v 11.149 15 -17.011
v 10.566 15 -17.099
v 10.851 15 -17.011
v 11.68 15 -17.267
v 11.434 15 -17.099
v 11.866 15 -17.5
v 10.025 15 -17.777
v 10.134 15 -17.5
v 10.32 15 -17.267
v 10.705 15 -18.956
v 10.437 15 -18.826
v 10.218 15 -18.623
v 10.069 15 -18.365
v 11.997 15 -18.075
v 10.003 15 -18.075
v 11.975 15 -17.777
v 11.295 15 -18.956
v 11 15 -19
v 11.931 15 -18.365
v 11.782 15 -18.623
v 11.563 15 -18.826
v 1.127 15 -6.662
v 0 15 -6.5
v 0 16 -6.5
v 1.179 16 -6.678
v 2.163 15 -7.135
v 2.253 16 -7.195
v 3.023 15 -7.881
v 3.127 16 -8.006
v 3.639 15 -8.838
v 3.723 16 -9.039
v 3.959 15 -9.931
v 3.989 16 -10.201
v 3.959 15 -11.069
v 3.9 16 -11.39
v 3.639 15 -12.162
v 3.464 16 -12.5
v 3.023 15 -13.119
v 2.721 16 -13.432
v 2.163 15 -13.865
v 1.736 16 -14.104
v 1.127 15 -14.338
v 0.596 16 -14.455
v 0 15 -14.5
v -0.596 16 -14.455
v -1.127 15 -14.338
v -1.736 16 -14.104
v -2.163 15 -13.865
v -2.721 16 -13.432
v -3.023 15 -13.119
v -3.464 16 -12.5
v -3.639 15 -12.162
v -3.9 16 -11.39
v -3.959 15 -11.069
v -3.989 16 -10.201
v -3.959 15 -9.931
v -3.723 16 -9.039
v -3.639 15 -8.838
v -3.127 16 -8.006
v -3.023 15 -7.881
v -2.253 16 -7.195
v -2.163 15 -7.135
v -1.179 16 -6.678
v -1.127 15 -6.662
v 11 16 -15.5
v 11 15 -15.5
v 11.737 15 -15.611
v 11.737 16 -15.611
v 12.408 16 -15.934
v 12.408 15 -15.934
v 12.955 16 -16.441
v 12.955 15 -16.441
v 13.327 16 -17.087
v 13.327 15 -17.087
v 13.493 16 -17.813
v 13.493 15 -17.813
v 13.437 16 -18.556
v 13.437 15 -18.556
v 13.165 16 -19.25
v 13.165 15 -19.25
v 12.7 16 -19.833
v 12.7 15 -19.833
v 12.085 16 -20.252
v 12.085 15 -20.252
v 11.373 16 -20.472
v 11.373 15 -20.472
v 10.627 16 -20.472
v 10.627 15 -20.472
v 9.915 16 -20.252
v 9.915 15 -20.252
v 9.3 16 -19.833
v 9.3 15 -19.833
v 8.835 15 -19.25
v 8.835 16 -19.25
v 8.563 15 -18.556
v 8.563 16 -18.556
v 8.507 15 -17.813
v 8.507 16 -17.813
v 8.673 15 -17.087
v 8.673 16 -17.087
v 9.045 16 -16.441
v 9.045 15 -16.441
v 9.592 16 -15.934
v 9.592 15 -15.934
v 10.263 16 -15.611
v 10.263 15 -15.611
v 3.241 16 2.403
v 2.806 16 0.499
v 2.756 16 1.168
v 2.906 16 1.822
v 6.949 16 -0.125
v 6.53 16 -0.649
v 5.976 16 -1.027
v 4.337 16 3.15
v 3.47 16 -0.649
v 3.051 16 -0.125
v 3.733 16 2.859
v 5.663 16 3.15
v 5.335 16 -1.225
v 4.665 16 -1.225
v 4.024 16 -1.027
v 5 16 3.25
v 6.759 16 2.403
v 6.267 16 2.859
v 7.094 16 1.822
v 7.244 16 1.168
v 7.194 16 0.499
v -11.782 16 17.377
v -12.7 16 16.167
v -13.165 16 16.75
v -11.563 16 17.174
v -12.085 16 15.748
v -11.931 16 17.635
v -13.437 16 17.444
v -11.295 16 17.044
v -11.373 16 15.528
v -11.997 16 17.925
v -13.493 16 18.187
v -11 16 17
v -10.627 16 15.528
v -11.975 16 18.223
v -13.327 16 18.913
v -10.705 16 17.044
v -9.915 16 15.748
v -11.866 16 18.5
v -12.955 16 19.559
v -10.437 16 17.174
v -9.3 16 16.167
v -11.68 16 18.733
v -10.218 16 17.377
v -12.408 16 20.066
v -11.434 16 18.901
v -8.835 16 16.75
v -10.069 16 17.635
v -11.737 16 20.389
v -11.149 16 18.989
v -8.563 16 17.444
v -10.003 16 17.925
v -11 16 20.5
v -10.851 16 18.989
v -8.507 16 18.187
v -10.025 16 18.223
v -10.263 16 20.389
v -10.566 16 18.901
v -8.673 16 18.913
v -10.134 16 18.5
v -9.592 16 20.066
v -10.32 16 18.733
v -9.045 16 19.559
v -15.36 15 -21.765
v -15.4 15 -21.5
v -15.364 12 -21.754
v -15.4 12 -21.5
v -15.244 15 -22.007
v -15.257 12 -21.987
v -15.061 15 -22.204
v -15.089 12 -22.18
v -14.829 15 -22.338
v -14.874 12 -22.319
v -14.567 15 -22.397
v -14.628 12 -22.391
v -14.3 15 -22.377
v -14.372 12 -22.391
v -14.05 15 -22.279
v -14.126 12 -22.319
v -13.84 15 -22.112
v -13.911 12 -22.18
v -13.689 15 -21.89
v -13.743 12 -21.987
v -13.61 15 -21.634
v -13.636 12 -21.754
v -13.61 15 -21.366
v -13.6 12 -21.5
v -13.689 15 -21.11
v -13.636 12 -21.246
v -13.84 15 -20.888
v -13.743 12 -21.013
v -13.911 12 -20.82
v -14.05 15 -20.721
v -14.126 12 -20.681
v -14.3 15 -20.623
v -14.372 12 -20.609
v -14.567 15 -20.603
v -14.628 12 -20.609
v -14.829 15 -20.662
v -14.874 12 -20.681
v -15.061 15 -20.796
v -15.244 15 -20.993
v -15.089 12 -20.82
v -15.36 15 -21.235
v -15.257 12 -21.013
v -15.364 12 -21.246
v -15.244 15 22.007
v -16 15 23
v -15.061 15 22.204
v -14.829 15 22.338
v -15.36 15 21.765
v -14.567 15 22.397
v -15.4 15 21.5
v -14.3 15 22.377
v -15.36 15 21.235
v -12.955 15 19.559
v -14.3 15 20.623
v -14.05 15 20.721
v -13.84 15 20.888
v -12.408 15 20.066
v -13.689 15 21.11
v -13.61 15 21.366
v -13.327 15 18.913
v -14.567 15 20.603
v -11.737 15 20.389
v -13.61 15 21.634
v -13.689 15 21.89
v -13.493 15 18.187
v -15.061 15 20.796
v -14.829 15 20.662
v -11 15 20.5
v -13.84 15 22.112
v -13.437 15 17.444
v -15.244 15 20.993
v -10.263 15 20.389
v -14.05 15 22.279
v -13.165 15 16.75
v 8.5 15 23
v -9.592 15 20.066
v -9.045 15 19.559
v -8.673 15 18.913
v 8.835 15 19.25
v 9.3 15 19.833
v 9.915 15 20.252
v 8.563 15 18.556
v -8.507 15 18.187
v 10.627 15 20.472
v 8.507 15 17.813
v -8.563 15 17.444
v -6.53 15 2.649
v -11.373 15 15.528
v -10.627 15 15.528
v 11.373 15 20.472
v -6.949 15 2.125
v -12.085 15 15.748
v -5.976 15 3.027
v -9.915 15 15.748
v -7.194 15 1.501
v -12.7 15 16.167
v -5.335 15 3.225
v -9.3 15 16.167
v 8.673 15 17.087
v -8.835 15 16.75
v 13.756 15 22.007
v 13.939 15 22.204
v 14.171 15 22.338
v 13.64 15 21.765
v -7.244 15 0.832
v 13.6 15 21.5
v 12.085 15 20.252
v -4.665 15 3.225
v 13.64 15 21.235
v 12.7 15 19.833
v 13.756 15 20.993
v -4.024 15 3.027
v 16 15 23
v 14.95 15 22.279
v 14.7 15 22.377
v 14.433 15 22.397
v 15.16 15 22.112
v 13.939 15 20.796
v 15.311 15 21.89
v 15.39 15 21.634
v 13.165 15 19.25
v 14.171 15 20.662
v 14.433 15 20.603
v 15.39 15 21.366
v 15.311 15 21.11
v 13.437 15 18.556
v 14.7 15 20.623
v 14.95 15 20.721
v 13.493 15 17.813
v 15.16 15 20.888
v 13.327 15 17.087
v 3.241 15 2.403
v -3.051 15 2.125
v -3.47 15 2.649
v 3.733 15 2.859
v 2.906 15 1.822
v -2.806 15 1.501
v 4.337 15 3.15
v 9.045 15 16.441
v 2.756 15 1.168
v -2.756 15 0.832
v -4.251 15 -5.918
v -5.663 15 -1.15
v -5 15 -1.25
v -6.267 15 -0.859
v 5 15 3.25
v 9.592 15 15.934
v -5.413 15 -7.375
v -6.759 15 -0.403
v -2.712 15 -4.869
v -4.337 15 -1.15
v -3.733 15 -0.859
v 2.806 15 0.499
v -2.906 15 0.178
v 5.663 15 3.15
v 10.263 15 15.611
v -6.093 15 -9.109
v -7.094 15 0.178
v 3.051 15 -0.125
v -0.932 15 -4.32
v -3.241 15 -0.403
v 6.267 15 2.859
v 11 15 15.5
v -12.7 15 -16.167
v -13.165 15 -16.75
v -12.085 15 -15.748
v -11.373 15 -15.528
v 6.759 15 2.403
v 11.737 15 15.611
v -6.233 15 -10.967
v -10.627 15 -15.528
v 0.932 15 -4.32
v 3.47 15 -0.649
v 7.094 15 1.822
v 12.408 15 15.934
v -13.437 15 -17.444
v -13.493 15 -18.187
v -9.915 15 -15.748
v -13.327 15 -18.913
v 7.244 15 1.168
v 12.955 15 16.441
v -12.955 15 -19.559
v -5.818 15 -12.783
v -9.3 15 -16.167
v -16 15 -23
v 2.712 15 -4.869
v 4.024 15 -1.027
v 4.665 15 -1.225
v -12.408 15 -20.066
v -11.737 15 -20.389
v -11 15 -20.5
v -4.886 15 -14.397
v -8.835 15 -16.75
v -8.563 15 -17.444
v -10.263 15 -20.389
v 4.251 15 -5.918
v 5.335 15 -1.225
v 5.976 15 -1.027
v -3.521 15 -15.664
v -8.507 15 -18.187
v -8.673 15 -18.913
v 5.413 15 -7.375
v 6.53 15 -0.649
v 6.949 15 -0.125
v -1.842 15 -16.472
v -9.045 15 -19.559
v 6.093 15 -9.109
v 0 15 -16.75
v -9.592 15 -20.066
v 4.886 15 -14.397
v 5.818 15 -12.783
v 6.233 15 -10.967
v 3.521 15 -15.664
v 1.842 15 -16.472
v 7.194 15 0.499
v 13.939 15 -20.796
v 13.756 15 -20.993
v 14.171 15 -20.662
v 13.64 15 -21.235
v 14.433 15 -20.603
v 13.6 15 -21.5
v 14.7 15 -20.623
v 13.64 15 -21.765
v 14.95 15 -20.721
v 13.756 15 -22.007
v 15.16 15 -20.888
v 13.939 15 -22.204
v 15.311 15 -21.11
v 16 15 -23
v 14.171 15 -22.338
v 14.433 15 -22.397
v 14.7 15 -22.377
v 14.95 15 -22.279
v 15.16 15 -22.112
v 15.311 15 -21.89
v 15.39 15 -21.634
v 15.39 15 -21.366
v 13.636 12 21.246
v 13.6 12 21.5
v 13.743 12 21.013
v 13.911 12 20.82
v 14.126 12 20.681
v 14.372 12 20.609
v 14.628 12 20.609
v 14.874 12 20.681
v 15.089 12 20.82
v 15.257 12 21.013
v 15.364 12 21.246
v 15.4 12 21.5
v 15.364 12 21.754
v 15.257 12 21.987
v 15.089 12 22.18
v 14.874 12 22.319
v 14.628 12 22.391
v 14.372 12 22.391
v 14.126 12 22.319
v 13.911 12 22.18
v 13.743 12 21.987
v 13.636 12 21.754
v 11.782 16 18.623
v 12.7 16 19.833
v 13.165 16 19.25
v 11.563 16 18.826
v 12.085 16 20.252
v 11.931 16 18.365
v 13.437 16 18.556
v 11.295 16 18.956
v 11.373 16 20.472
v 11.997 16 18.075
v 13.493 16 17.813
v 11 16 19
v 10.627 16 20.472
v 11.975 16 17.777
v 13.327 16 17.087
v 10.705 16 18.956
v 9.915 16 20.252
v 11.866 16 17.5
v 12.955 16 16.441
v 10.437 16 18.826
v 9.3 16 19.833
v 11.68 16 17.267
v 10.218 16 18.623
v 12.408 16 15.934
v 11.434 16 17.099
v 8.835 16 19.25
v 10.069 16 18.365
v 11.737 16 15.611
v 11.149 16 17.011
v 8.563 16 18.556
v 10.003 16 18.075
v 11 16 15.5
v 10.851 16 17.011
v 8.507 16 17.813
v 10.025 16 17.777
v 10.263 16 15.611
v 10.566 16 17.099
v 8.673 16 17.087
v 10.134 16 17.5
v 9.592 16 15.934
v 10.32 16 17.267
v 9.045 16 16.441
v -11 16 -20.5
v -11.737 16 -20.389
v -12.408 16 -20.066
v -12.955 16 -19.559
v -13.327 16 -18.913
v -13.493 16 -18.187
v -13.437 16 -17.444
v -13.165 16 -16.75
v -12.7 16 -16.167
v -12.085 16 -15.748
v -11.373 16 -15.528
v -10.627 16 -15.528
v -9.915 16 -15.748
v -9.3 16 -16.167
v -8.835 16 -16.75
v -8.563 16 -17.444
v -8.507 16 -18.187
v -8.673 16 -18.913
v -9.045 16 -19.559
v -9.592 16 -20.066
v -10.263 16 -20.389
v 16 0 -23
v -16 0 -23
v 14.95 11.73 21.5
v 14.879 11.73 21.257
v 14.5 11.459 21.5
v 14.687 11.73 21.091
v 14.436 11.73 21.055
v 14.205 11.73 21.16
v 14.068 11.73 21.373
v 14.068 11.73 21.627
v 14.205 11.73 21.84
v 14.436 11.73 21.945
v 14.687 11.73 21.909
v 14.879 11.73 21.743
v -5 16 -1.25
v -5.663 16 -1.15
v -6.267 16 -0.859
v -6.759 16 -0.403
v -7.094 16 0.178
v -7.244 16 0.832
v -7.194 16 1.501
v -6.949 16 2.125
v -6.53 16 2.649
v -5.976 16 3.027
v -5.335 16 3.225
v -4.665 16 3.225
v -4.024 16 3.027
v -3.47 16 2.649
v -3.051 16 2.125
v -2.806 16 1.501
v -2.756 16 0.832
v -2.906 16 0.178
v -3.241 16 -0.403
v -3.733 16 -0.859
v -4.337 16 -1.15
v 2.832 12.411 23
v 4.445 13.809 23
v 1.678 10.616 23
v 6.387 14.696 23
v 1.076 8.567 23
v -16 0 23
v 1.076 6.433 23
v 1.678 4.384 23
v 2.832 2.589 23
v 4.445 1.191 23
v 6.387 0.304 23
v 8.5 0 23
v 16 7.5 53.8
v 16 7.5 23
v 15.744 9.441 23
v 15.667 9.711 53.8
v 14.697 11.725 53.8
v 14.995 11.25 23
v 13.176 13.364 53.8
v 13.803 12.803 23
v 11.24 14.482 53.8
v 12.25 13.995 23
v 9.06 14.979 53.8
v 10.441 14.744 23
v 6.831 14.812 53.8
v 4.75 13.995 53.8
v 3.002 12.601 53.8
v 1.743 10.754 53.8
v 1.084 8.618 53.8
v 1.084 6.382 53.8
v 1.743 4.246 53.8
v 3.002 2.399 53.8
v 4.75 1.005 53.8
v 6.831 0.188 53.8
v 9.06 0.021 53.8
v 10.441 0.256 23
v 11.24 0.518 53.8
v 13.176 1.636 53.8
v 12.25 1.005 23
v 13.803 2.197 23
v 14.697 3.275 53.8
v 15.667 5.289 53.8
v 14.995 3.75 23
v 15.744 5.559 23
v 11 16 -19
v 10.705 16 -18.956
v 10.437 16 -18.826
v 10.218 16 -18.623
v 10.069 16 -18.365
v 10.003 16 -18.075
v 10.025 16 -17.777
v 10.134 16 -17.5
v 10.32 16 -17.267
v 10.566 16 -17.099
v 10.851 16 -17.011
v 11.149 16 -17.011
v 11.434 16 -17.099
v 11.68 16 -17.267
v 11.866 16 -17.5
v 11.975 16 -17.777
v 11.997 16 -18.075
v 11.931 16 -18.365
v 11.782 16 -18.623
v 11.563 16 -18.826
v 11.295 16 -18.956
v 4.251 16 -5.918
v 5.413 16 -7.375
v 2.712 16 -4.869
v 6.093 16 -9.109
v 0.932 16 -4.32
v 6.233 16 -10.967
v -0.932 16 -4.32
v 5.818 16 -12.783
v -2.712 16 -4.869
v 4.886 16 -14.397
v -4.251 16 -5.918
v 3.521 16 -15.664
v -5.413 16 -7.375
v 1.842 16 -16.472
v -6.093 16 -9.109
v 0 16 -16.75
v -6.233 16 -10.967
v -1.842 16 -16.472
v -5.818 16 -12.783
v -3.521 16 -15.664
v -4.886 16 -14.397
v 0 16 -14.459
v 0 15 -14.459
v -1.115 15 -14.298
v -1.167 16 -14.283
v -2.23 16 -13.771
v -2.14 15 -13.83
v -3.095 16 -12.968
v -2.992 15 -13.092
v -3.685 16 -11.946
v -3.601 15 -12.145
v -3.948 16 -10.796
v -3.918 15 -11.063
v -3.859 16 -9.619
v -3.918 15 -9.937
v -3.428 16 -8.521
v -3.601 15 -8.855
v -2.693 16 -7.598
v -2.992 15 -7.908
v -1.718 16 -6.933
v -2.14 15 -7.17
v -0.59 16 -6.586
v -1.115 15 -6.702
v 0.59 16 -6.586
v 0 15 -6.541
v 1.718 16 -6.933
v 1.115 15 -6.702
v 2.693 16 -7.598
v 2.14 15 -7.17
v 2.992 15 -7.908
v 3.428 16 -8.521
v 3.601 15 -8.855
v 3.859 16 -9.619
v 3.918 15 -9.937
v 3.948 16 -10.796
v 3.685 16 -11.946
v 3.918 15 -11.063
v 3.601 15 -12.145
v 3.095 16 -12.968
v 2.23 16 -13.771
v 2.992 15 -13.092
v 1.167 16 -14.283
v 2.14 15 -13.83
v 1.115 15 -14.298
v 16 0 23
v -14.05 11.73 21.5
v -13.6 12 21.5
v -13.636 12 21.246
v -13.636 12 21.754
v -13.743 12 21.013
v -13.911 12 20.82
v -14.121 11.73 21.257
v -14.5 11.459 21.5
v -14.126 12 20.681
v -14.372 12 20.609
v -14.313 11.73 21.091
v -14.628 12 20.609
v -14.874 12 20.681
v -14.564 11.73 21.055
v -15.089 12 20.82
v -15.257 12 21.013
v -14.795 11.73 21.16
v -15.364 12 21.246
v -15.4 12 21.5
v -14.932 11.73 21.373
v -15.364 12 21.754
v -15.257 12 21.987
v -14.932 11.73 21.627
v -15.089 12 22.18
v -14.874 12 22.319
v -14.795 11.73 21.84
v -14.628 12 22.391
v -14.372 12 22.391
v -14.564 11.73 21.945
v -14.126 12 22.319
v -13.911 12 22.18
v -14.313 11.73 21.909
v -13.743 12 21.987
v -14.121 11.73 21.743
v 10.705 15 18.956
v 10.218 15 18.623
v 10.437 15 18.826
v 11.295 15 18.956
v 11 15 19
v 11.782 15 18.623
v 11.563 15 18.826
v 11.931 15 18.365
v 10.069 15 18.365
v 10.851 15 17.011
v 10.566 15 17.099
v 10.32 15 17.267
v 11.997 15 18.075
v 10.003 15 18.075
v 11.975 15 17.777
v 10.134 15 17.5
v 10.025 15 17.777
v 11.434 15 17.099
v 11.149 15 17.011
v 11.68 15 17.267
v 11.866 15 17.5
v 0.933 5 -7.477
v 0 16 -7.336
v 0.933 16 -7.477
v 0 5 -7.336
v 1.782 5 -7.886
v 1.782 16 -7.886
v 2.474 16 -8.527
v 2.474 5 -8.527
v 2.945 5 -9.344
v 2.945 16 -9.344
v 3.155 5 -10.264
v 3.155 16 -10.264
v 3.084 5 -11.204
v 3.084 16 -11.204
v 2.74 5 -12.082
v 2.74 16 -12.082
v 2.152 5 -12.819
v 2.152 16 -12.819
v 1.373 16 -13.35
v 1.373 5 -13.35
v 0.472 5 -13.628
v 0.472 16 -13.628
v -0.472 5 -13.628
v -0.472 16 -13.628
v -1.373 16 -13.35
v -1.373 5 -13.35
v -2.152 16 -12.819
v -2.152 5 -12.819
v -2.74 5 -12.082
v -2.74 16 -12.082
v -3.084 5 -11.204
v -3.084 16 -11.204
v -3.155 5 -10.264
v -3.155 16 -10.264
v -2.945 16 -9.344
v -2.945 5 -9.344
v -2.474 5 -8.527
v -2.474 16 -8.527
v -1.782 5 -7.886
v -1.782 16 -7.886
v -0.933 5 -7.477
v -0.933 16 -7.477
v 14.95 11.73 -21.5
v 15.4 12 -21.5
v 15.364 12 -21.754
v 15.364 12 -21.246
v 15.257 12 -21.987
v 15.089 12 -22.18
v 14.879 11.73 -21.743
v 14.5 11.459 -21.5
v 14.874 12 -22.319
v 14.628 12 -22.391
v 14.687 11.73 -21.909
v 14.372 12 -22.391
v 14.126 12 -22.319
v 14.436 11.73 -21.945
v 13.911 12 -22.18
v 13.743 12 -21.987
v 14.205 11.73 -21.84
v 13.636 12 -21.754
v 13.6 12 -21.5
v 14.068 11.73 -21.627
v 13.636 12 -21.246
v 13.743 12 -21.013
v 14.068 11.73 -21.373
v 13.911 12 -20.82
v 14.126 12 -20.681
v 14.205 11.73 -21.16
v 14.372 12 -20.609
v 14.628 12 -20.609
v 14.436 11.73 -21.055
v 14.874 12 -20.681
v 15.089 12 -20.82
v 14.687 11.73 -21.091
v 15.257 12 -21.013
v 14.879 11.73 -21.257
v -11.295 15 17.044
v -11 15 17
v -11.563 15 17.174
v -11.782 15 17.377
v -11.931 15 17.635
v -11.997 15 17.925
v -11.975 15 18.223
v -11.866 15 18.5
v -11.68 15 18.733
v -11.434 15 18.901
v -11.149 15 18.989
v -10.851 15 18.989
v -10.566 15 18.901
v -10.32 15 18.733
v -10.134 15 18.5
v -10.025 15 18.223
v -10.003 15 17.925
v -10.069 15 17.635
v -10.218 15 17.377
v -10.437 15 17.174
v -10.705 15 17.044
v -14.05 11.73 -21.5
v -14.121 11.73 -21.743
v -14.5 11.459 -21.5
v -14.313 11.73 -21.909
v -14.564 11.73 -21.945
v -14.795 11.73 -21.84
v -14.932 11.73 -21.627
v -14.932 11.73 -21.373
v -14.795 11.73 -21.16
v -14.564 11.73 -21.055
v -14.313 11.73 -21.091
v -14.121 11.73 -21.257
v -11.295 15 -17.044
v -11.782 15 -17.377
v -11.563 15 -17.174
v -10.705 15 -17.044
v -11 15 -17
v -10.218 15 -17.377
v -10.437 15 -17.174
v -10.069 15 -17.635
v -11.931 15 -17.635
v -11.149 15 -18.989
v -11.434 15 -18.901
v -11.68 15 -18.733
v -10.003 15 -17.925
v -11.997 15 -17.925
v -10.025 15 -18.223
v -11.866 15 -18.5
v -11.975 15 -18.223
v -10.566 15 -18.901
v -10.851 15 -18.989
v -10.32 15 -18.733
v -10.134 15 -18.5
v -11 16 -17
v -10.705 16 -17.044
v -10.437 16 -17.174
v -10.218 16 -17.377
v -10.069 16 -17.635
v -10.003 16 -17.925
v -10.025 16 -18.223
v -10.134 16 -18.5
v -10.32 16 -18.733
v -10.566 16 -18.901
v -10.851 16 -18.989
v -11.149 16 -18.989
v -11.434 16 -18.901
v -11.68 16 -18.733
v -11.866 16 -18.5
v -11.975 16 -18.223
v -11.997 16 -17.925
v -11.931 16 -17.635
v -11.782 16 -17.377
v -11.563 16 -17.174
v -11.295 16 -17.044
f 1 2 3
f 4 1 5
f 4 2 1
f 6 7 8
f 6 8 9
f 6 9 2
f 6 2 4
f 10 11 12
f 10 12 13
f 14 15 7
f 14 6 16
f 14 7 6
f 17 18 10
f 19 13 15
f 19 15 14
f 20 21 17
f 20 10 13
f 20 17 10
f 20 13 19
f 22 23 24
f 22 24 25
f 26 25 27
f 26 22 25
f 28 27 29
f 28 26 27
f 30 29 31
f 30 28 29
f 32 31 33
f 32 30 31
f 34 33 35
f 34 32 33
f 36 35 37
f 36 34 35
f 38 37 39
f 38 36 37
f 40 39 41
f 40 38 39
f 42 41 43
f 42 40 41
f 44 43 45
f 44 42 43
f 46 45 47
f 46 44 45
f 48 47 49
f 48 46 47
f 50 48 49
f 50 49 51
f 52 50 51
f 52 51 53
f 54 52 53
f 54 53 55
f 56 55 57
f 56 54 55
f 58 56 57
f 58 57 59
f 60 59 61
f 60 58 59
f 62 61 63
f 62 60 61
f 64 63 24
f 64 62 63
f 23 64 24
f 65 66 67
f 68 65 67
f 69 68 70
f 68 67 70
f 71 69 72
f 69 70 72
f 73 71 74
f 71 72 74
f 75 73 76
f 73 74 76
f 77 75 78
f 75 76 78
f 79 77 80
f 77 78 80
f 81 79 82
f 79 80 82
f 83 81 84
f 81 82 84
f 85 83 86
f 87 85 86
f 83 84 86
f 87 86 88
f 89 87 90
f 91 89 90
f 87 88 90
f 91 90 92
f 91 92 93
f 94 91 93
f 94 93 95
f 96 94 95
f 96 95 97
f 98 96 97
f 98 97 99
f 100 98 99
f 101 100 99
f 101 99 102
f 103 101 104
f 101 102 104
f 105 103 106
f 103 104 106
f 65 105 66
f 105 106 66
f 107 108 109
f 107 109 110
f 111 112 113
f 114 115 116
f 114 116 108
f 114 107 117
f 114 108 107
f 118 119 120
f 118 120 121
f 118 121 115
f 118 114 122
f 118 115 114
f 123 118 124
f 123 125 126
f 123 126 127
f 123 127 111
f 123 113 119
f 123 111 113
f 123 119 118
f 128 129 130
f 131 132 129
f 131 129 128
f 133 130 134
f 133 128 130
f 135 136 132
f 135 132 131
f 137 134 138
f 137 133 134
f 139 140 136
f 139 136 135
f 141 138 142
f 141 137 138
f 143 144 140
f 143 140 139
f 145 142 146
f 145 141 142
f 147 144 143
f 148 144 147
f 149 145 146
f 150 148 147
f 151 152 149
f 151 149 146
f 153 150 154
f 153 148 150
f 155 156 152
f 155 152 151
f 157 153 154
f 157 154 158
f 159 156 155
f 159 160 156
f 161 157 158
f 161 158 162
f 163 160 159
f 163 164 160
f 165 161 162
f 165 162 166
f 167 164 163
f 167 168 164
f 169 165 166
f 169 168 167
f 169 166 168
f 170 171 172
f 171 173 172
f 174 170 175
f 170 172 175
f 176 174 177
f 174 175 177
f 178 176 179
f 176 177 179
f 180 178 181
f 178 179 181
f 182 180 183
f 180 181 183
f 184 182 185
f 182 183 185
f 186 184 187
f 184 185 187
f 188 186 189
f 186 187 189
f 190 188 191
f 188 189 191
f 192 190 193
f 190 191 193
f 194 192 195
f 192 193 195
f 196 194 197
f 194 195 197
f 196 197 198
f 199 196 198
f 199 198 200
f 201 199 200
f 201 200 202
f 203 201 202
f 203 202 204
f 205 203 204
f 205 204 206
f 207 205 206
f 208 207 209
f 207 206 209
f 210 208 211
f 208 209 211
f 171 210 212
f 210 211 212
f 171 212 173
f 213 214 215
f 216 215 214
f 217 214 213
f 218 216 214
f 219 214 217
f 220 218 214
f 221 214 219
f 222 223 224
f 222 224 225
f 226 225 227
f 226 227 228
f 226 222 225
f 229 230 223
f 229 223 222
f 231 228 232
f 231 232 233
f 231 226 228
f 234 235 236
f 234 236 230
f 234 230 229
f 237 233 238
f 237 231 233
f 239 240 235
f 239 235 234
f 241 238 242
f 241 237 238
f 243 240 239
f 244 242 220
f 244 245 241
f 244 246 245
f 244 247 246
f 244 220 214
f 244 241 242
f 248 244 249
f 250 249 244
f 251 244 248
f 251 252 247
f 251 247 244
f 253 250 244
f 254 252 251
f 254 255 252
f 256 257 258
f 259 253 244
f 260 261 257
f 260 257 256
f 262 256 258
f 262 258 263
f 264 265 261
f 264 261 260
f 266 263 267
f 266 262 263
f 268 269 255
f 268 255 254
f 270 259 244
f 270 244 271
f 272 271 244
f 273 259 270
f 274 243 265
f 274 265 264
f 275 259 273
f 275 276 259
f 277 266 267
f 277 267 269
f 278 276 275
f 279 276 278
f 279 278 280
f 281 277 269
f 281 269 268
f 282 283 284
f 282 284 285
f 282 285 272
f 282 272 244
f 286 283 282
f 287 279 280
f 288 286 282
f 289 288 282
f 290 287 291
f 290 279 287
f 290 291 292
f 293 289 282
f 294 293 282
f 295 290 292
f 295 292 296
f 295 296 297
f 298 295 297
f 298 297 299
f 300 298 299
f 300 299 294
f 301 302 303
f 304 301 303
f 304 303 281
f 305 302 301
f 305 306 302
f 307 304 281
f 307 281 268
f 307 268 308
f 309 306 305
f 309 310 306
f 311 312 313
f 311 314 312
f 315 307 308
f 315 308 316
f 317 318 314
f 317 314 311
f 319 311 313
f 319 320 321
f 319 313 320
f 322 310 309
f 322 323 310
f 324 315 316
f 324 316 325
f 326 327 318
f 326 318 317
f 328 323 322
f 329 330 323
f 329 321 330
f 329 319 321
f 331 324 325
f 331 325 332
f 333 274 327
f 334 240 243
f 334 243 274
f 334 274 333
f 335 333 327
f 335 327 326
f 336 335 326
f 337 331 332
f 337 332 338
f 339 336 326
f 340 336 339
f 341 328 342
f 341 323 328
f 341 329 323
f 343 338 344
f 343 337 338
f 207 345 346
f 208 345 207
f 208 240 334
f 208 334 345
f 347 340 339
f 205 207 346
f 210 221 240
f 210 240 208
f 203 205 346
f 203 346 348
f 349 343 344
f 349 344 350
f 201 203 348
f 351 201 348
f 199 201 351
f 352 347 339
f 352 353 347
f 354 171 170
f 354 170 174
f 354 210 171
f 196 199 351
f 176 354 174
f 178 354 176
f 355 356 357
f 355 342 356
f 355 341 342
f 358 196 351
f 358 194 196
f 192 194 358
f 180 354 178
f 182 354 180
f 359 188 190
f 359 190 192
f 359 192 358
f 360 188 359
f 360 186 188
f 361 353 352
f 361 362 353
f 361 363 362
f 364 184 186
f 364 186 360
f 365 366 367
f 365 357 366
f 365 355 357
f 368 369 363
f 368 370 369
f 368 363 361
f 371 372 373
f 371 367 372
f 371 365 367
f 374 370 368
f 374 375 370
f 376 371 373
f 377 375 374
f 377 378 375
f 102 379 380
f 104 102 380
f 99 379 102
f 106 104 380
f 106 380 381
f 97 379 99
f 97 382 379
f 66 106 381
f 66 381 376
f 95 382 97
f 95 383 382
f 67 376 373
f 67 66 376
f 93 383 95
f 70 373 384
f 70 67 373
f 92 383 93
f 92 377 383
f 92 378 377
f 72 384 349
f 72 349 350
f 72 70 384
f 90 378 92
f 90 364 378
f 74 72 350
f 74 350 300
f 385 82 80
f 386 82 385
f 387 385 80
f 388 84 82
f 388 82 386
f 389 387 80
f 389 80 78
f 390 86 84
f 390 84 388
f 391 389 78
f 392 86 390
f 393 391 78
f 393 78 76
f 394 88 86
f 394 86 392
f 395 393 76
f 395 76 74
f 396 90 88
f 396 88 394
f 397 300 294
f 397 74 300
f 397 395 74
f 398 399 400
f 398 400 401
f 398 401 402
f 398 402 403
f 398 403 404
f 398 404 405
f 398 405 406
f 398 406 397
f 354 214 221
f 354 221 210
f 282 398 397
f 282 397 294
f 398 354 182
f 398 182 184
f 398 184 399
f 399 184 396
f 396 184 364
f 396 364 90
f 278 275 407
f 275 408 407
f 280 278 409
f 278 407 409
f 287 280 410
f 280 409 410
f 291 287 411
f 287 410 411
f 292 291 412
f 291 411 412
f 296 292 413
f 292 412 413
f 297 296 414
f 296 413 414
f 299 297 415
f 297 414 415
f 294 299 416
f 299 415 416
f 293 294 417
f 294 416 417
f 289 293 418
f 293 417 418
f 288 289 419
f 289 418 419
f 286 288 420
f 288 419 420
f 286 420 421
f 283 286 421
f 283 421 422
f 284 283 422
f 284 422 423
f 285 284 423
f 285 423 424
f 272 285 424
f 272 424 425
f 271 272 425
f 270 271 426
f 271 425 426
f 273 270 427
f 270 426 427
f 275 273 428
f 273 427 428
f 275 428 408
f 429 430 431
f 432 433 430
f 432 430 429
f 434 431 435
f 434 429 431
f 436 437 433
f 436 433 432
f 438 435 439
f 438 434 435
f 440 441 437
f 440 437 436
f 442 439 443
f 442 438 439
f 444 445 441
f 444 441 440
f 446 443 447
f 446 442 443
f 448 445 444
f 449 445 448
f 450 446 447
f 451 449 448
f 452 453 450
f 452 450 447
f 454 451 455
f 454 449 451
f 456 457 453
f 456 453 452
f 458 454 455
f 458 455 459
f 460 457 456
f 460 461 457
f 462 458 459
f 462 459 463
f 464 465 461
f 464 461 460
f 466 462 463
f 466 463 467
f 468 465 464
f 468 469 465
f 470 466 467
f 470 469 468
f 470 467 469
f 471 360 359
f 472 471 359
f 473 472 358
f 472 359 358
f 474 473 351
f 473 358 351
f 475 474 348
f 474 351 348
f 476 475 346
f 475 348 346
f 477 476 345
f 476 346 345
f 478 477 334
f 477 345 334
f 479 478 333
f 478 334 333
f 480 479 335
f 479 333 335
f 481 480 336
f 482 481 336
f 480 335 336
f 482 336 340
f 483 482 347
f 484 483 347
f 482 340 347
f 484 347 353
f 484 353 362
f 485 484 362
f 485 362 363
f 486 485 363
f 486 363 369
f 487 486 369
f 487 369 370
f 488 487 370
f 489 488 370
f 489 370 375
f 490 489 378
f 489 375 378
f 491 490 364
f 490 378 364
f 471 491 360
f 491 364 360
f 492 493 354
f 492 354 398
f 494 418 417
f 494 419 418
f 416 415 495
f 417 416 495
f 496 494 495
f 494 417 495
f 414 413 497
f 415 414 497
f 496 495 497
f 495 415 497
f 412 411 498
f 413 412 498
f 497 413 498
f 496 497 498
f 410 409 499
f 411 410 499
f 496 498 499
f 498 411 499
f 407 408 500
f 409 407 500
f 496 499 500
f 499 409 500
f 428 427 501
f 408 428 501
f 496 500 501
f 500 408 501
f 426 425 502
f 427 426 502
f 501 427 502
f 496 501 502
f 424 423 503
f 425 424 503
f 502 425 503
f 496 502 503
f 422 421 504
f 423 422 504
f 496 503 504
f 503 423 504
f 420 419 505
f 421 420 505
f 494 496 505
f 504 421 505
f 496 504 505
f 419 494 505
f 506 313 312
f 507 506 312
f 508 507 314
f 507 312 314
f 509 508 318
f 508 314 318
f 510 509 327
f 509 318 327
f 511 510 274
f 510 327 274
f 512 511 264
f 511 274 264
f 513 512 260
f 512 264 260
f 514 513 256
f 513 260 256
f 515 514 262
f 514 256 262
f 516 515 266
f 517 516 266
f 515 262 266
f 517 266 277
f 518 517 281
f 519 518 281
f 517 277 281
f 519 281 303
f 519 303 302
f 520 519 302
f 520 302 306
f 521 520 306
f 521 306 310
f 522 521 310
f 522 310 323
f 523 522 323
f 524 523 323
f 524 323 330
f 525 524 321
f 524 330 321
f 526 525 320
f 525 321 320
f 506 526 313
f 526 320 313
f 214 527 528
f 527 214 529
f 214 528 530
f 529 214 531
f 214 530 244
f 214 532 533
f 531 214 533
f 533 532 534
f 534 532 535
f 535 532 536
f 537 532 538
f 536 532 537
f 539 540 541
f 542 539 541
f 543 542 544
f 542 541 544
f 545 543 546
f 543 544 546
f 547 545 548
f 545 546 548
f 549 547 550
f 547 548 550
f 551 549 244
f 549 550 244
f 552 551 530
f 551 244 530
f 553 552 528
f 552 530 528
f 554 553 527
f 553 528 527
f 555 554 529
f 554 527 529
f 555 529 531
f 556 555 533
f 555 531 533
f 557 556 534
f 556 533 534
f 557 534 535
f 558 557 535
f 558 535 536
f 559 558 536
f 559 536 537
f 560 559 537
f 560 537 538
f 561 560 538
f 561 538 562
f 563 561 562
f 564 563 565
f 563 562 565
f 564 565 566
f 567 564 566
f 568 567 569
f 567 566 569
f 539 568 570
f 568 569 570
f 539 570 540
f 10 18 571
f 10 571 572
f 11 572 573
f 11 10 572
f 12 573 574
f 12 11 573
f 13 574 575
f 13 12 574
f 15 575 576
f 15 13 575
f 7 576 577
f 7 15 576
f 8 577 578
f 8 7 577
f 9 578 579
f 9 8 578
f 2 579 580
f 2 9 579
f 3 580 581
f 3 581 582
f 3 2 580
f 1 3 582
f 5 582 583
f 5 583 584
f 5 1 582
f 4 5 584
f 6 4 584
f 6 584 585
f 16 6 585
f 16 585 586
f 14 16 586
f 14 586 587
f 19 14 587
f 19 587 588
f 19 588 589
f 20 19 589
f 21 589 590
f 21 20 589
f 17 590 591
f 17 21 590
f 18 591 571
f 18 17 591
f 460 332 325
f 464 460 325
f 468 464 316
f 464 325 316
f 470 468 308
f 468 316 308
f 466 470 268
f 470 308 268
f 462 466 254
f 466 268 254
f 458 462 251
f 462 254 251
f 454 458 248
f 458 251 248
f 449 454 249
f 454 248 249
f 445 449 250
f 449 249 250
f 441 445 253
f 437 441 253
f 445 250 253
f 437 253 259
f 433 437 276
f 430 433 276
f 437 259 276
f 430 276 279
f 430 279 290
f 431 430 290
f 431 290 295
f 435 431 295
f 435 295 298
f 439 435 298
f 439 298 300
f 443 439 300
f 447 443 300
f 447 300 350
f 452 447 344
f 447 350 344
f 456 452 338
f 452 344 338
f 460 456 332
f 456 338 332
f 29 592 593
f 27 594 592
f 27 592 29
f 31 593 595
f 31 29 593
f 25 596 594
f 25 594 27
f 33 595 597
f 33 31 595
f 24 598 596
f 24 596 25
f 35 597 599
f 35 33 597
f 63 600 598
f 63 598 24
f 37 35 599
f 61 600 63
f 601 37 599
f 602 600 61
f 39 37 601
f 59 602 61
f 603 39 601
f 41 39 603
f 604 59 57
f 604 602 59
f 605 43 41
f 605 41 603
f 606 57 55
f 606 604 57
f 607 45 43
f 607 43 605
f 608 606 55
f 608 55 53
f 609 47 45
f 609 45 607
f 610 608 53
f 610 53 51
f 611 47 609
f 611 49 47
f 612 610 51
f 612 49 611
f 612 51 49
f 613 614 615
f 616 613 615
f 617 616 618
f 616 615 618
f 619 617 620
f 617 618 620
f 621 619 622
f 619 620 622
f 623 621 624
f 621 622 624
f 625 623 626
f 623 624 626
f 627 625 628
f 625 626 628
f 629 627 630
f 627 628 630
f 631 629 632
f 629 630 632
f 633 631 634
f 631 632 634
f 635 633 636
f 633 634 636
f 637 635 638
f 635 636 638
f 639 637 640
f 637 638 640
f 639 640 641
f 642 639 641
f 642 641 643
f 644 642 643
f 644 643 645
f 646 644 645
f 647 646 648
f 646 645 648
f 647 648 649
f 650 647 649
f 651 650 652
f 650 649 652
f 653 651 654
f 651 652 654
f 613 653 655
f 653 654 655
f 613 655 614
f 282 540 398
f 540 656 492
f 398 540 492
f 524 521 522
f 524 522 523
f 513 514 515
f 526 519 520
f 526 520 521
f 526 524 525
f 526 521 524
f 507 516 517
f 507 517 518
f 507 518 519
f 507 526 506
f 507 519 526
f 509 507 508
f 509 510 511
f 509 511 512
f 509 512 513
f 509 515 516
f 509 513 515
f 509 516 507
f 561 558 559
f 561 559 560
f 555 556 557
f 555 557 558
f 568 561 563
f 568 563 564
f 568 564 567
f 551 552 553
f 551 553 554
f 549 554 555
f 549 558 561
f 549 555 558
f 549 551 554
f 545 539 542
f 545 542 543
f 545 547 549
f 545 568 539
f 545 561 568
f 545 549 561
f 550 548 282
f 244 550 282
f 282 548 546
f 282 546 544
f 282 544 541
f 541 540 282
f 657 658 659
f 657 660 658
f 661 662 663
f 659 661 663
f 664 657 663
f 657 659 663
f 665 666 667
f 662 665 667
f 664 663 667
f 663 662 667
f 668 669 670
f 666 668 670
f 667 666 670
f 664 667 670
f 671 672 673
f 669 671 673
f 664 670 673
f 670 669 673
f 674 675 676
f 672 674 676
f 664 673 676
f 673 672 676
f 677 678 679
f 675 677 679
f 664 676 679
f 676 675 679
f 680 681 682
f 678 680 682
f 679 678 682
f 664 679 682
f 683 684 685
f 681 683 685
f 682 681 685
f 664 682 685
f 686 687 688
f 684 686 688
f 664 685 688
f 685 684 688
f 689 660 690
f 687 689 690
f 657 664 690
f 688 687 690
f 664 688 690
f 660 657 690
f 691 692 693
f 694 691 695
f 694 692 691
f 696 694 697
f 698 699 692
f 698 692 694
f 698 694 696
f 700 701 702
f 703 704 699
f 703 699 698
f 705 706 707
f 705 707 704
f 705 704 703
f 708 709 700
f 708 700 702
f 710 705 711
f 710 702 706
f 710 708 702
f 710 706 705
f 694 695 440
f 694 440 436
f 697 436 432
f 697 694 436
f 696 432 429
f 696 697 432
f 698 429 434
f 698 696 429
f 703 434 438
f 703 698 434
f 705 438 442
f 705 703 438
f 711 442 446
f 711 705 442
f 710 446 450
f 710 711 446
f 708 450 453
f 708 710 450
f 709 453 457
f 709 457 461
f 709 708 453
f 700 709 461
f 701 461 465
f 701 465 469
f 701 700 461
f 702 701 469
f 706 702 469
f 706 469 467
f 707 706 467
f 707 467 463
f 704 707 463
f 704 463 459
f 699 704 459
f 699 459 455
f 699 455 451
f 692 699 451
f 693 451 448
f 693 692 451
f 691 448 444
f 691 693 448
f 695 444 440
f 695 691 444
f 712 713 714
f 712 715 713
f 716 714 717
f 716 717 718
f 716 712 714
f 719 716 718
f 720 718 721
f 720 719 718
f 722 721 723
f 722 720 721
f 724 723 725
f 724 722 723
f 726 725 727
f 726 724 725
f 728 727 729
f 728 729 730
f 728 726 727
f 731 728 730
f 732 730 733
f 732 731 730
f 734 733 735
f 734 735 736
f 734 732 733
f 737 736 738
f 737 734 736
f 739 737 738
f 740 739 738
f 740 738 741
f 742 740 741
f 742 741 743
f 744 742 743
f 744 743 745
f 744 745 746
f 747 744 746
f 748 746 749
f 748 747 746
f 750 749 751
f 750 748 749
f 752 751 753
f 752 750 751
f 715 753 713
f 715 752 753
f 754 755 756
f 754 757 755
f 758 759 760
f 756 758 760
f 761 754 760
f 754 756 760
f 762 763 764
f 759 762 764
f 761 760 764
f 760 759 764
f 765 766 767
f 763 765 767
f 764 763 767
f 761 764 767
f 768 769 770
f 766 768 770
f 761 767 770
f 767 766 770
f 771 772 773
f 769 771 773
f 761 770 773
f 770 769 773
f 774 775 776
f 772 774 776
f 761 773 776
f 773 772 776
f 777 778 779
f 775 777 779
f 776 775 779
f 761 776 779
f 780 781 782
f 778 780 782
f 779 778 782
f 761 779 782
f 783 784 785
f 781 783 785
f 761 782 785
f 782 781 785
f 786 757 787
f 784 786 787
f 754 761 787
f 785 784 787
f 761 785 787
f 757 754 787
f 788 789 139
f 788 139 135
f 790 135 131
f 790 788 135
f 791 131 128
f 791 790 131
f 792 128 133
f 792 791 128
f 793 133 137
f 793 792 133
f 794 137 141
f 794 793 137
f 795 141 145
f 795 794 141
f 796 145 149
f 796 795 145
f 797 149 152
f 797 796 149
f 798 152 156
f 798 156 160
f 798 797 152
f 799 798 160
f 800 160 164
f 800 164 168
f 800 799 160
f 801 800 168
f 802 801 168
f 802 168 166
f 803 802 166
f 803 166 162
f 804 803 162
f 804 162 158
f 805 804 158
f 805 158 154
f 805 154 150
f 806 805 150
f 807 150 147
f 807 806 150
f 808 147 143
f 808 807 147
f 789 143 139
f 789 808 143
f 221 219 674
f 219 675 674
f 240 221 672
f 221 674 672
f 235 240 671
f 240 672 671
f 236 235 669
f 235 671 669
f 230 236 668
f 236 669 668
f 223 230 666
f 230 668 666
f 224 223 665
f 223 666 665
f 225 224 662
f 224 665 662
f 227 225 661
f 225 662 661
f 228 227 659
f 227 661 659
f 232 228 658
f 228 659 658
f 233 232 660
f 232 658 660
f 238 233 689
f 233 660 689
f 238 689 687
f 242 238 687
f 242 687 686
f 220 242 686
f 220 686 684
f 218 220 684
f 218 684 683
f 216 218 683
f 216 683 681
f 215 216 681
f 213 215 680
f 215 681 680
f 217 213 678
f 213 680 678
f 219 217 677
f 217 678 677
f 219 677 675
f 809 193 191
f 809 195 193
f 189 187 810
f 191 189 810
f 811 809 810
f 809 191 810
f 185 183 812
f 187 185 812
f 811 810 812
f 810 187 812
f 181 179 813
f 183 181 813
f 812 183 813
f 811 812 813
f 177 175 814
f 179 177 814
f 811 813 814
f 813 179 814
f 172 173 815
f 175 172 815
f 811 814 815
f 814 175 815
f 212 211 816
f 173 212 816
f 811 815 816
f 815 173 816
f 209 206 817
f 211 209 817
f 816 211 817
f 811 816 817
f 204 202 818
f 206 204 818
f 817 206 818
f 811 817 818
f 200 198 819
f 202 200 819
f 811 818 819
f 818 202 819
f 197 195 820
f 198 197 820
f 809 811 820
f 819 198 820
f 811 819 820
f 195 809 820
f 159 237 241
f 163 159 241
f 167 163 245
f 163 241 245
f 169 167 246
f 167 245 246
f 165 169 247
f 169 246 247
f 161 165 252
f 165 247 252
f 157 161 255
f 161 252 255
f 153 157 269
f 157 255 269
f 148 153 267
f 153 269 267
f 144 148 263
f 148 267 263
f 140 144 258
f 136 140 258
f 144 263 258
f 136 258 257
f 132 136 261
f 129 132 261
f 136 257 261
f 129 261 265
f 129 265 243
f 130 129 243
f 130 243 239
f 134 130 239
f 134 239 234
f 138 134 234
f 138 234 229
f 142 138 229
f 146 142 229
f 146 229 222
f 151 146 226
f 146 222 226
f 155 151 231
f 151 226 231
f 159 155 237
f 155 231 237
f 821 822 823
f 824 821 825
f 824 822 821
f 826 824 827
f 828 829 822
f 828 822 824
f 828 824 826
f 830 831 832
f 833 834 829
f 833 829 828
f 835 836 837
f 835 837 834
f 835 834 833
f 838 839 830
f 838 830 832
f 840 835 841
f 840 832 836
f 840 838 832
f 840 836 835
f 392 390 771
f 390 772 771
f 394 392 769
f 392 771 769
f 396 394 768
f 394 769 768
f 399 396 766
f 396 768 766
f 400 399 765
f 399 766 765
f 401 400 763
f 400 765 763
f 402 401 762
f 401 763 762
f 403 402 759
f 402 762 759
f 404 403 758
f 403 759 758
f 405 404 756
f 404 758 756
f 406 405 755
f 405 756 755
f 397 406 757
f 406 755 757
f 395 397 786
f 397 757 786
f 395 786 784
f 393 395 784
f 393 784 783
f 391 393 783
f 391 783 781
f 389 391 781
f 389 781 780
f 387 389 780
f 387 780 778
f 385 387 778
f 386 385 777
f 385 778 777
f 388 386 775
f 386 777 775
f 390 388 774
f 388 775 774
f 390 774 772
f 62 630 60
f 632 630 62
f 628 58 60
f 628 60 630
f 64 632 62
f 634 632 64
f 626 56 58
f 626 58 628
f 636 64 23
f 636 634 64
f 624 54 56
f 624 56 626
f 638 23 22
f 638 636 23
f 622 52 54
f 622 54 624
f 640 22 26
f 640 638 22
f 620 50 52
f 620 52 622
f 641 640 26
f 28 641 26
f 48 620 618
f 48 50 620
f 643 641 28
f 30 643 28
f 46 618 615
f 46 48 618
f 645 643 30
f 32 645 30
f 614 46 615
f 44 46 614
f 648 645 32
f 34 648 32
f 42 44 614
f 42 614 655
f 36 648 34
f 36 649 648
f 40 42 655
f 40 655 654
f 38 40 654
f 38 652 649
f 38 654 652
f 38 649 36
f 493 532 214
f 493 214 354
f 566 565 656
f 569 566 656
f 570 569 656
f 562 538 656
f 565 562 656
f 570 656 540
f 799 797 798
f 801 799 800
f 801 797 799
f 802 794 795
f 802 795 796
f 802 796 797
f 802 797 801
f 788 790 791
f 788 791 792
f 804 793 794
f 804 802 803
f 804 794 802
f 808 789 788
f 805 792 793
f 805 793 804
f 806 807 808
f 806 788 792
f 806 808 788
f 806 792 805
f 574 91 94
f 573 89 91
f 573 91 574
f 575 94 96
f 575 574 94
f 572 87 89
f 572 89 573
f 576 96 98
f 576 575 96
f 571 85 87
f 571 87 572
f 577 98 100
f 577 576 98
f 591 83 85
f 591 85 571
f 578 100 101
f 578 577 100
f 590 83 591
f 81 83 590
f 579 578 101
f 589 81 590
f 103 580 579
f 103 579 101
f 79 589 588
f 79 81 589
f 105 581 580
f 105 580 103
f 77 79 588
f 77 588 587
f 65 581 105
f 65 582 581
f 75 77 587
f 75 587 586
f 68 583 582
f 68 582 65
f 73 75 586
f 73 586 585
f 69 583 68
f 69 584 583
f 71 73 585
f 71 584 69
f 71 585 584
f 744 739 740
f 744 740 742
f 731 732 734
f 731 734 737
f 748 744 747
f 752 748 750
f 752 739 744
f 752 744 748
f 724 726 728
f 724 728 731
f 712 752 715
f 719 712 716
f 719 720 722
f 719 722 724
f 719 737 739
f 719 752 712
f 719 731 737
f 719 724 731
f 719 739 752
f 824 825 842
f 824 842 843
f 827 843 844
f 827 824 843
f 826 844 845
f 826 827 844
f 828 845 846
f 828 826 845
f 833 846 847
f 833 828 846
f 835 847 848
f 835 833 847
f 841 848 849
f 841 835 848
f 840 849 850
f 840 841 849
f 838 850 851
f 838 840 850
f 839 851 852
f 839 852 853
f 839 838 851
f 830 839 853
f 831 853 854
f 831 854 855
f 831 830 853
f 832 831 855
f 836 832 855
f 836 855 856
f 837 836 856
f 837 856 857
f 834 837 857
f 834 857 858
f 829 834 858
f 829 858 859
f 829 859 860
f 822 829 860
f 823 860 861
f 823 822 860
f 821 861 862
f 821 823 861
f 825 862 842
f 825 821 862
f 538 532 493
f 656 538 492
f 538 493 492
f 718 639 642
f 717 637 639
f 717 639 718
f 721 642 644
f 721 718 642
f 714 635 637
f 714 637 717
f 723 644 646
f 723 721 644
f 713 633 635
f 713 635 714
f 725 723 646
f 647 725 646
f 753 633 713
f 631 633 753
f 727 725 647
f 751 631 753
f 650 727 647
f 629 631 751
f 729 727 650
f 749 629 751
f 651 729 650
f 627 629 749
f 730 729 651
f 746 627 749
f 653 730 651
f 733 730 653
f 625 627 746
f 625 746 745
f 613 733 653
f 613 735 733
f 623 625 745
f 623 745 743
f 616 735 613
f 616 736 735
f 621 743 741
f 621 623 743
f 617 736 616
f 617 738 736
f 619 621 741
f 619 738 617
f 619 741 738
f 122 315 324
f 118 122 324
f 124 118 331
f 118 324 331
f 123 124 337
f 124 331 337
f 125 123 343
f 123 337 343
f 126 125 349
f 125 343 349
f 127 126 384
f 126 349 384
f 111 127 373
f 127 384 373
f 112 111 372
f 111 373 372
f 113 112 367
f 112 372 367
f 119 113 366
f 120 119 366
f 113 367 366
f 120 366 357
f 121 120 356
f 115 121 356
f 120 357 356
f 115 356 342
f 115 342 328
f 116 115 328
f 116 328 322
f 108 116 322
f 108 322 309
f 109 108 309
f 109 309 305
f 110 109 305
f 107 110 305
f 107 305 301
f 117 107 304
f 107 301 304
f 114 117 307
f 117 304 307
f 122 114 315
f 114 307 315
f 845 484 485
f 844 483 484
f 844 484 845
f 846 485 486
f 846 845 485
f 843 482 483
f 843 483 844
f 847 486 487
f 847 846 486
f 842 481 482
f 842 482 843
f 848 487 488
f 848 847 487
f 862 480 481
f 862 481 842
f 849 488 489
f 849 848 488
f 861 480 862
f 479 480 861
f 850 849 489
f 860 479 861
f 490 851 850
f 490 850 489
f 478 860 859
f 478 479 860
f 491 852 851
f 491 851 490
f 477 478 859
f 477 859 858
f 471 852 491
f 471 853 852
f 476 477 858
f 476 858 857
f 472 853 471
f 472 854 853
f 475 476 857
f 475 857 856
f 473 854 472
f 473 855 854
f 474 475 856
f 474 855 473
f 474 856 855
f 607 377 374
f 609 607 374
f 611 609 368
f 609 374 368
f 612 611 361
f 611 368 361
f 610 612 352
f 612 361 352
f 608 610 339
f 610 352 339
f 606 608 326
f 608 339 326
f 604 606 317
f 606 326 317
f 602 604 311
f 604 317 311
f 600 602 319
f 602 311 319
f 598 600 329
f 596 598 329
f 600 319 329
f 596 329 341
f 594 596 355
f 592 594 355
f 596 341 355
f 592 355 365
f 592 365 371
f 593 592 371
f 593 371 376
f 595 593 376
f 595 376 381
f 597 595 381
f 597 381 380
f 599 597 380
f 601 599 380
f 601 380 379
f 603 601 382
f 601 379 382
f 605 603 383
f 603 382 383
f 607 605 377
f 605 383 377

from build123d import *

# Parameters (mm, degrees)
CROQUIS1_W                         = 32
CROQUIS1_H                         = 46
SALIENTE_EXTRUIR1_DEPTH            = 15
CROQUIS2_R                         = 7.5
SALIENTE_EXTRUIR2_DEPTH            = 30.8
CROQUIS3_R                         = 6.25
CROQUIS3_R_2                       = 4
CROQUIS3_R_3                       = 2.5
CROQUIS3_R_4                       = 1
CROQUIS3_R_5                       = 2.25
CROQUIS3_R_6                       = 3.958709401
CROQUIS3_R_7                       = 3.163808824
SALIENTE_EXTRUIR3_DEPTH            = 1
CORTAR_EXTRUIR1_START              = -10
CROQUIS3_3_R                       = 3.163808824
CORTAR_EXTRUIR1_DEPTH              = 10
TALADRO_DE_MARGEN_PARA_M1_41_D     = 1.8
TALADRO_DE_MARGEN_PARA_M1_41_DEPTH = 3
TALADRO_DE_MARGEN_PARA_M1_41_TIP   = 0.540774557


with BuildPart() as part:
    # Croquis1 → Saliente-Extruir1 (new body)
    with BuildSketch(Plane(origin=(0, 0, 0), x_dir=(1, 0, 0), z_dir=(0, 1, 0))):
        Rectangle(CROQUIS1_W, CROQUIS1_H)
    extrude(amount=SALIENTE_EXTRUIR1_DEPTH)

    # Croquis2 → Saliente-Extruir2 (add)
    with BuildSketch(Plane.XY.offset(23)):
        with Locations((8.5, 7.5)):
            Circle(CROQUIS2_R)
    extrude(amount=SALIENTE_EXTRUIR2_DEPTH)

    # Croquis3 → Saliente-Extruir3 (add)
    # profile 1 of 8: a face of its own
    with BuildSketch(Plane(origin=(0, 15, 0), x_dir=(1, 0, 0), z_dir=(0, 1, 0))):
        with Locations((0, 10.5)):
            Circle(CROQUIS3_R)
        with Locations((0, 10.5)):
            Circle(CROQUIS3_R_2, mode=Mode.SUBTRACT)
    # profile 2 of 8: a face of its own
    with BuildSketch(Plane(origin=(0, 15, 0), x_dir=(1, 0, 0), z_dir=(0, 1, 0))):
        with Locations((-11, 18)):
            Circle(CROQUIS3_R_3)
        with Locations((-11, 18)):
            Circle(CROQUIS3_R_4, mode=Mode.SUBTRACT)
    # profile 3 of 8: a face of its own
    with BuildSketch(Plane(origin=(0, 15, 0), x_dir=(1, 0, 0), z_dir=(0, 1, 0))):
        with Locations((-5, -1)):
            Circle(CROQUIS3_R_5)
    # profile 4 of 8: a face of its own
    with BuildSketch(Plane(origin=(0, 15, 0), x_dir=(1, 0, 0), z_dir=(0, 1, 0))):
        with Locations((11, 18)):
            Circle(CROQUIS3_R_3)
        with Locations((11, 18)):
            Circle(CROQUIS3_R_4, mode=Mode.SUBTRACT)
    # profile 5 of 8: a face of its own
    with BuildSketch(Plane(origin=(0, 15, 0), x_dir=(1, 0, 0), z_dir=(0, 1, 0))):
        with Locations((11, -18)):
            Circle(CROQUIS3_R_3)
        with Locations((11, -18)):
            Circle(CROQUIS3_R_4, mode=Mode.SUBTRACT)
    # profile 6 of 8: a face of its own
    with BuildSketch(Plane(origin=(0, 15, 0), x_dir=(1, 0, 0), z_dir=(0, 1, 0))):
        with Locations((-11, -18)):
            Circle(CROQUIS3_R_3)
        with Locations((-11, -18)):
            Circle(CROQUIS3_R_4, mode=Mode.SUBTRACT)
    # profile 7 of 8: a face of its own
    with BuildSketch(Plane(origin=(0, 15, 0), x_dir=(1, 0, 0), z_dir=(0, 1, 0))):
        with Locations((5, -1)):
            Circle(CROQUIS3_R_5)
    # profile 8 of 8: a face of its own
    with BuildSketch(Plane(origin=(0, 15, 0), x_dir=(1, 0, 0), z_dir=(0, 1, 0))):
        with Locations((0, 10.5)):
            Circle(CROQUIS3_R_6)
        with Locations((0, 10.5)):
            Circle(CROQUIS3_R_7, mode=Mode.SUBTRACT)
    extrude(amount=SALIENTE_EXTRUIR3_DEPTH)

    # Croquis3<3> → Cortar-Extruir1 (cut)
    with BuildSketch(Plane(origin=(0, 15, 0), x_dir=(1, 0, 0), z_dir=(0, 1, 0)).offset(CORTAR_EXTRUIR1_START)):
        with Locations((0, 10.5)):
            Circle(CROQUIS3_3_R)
    extrude(amount=CORTAR_EXTRUIR1_DEPTH, mode=Mode.SUBTRACT)

    # Taladro de margen para M1.41
    with Locations(Plane(origin=(0, 15, 0), x_dir=(1, 0, 0), z_dir=(0, 1, 0))):
        with Locations((-14.5, 21.5), (14.5, 21.5), (-14.5, -21.5), (14.5, -21.5)):
            Hole(TALADRO_DE_MARGEN_PARA_M1_41_D / 2, depth=TALADRO_DE_MARGEN_PARA_M1_41_DEPTH)
            with Locations((0, 0, -(TALADRO_DE_MARGEN_PARA_M1_41_DEPTH + TALADRO_DE_MARGEN_PARA_M1_41_TIP / 2))):  # 118° drill point
                Cone(0, TALADRO_DE_MARGEN_PARA_M1_41_D / 2, TALADRO_DE_MARGEN_PARA_M1_41_TIP, mode=Mode.SUBTRACT)


solid = part.part
